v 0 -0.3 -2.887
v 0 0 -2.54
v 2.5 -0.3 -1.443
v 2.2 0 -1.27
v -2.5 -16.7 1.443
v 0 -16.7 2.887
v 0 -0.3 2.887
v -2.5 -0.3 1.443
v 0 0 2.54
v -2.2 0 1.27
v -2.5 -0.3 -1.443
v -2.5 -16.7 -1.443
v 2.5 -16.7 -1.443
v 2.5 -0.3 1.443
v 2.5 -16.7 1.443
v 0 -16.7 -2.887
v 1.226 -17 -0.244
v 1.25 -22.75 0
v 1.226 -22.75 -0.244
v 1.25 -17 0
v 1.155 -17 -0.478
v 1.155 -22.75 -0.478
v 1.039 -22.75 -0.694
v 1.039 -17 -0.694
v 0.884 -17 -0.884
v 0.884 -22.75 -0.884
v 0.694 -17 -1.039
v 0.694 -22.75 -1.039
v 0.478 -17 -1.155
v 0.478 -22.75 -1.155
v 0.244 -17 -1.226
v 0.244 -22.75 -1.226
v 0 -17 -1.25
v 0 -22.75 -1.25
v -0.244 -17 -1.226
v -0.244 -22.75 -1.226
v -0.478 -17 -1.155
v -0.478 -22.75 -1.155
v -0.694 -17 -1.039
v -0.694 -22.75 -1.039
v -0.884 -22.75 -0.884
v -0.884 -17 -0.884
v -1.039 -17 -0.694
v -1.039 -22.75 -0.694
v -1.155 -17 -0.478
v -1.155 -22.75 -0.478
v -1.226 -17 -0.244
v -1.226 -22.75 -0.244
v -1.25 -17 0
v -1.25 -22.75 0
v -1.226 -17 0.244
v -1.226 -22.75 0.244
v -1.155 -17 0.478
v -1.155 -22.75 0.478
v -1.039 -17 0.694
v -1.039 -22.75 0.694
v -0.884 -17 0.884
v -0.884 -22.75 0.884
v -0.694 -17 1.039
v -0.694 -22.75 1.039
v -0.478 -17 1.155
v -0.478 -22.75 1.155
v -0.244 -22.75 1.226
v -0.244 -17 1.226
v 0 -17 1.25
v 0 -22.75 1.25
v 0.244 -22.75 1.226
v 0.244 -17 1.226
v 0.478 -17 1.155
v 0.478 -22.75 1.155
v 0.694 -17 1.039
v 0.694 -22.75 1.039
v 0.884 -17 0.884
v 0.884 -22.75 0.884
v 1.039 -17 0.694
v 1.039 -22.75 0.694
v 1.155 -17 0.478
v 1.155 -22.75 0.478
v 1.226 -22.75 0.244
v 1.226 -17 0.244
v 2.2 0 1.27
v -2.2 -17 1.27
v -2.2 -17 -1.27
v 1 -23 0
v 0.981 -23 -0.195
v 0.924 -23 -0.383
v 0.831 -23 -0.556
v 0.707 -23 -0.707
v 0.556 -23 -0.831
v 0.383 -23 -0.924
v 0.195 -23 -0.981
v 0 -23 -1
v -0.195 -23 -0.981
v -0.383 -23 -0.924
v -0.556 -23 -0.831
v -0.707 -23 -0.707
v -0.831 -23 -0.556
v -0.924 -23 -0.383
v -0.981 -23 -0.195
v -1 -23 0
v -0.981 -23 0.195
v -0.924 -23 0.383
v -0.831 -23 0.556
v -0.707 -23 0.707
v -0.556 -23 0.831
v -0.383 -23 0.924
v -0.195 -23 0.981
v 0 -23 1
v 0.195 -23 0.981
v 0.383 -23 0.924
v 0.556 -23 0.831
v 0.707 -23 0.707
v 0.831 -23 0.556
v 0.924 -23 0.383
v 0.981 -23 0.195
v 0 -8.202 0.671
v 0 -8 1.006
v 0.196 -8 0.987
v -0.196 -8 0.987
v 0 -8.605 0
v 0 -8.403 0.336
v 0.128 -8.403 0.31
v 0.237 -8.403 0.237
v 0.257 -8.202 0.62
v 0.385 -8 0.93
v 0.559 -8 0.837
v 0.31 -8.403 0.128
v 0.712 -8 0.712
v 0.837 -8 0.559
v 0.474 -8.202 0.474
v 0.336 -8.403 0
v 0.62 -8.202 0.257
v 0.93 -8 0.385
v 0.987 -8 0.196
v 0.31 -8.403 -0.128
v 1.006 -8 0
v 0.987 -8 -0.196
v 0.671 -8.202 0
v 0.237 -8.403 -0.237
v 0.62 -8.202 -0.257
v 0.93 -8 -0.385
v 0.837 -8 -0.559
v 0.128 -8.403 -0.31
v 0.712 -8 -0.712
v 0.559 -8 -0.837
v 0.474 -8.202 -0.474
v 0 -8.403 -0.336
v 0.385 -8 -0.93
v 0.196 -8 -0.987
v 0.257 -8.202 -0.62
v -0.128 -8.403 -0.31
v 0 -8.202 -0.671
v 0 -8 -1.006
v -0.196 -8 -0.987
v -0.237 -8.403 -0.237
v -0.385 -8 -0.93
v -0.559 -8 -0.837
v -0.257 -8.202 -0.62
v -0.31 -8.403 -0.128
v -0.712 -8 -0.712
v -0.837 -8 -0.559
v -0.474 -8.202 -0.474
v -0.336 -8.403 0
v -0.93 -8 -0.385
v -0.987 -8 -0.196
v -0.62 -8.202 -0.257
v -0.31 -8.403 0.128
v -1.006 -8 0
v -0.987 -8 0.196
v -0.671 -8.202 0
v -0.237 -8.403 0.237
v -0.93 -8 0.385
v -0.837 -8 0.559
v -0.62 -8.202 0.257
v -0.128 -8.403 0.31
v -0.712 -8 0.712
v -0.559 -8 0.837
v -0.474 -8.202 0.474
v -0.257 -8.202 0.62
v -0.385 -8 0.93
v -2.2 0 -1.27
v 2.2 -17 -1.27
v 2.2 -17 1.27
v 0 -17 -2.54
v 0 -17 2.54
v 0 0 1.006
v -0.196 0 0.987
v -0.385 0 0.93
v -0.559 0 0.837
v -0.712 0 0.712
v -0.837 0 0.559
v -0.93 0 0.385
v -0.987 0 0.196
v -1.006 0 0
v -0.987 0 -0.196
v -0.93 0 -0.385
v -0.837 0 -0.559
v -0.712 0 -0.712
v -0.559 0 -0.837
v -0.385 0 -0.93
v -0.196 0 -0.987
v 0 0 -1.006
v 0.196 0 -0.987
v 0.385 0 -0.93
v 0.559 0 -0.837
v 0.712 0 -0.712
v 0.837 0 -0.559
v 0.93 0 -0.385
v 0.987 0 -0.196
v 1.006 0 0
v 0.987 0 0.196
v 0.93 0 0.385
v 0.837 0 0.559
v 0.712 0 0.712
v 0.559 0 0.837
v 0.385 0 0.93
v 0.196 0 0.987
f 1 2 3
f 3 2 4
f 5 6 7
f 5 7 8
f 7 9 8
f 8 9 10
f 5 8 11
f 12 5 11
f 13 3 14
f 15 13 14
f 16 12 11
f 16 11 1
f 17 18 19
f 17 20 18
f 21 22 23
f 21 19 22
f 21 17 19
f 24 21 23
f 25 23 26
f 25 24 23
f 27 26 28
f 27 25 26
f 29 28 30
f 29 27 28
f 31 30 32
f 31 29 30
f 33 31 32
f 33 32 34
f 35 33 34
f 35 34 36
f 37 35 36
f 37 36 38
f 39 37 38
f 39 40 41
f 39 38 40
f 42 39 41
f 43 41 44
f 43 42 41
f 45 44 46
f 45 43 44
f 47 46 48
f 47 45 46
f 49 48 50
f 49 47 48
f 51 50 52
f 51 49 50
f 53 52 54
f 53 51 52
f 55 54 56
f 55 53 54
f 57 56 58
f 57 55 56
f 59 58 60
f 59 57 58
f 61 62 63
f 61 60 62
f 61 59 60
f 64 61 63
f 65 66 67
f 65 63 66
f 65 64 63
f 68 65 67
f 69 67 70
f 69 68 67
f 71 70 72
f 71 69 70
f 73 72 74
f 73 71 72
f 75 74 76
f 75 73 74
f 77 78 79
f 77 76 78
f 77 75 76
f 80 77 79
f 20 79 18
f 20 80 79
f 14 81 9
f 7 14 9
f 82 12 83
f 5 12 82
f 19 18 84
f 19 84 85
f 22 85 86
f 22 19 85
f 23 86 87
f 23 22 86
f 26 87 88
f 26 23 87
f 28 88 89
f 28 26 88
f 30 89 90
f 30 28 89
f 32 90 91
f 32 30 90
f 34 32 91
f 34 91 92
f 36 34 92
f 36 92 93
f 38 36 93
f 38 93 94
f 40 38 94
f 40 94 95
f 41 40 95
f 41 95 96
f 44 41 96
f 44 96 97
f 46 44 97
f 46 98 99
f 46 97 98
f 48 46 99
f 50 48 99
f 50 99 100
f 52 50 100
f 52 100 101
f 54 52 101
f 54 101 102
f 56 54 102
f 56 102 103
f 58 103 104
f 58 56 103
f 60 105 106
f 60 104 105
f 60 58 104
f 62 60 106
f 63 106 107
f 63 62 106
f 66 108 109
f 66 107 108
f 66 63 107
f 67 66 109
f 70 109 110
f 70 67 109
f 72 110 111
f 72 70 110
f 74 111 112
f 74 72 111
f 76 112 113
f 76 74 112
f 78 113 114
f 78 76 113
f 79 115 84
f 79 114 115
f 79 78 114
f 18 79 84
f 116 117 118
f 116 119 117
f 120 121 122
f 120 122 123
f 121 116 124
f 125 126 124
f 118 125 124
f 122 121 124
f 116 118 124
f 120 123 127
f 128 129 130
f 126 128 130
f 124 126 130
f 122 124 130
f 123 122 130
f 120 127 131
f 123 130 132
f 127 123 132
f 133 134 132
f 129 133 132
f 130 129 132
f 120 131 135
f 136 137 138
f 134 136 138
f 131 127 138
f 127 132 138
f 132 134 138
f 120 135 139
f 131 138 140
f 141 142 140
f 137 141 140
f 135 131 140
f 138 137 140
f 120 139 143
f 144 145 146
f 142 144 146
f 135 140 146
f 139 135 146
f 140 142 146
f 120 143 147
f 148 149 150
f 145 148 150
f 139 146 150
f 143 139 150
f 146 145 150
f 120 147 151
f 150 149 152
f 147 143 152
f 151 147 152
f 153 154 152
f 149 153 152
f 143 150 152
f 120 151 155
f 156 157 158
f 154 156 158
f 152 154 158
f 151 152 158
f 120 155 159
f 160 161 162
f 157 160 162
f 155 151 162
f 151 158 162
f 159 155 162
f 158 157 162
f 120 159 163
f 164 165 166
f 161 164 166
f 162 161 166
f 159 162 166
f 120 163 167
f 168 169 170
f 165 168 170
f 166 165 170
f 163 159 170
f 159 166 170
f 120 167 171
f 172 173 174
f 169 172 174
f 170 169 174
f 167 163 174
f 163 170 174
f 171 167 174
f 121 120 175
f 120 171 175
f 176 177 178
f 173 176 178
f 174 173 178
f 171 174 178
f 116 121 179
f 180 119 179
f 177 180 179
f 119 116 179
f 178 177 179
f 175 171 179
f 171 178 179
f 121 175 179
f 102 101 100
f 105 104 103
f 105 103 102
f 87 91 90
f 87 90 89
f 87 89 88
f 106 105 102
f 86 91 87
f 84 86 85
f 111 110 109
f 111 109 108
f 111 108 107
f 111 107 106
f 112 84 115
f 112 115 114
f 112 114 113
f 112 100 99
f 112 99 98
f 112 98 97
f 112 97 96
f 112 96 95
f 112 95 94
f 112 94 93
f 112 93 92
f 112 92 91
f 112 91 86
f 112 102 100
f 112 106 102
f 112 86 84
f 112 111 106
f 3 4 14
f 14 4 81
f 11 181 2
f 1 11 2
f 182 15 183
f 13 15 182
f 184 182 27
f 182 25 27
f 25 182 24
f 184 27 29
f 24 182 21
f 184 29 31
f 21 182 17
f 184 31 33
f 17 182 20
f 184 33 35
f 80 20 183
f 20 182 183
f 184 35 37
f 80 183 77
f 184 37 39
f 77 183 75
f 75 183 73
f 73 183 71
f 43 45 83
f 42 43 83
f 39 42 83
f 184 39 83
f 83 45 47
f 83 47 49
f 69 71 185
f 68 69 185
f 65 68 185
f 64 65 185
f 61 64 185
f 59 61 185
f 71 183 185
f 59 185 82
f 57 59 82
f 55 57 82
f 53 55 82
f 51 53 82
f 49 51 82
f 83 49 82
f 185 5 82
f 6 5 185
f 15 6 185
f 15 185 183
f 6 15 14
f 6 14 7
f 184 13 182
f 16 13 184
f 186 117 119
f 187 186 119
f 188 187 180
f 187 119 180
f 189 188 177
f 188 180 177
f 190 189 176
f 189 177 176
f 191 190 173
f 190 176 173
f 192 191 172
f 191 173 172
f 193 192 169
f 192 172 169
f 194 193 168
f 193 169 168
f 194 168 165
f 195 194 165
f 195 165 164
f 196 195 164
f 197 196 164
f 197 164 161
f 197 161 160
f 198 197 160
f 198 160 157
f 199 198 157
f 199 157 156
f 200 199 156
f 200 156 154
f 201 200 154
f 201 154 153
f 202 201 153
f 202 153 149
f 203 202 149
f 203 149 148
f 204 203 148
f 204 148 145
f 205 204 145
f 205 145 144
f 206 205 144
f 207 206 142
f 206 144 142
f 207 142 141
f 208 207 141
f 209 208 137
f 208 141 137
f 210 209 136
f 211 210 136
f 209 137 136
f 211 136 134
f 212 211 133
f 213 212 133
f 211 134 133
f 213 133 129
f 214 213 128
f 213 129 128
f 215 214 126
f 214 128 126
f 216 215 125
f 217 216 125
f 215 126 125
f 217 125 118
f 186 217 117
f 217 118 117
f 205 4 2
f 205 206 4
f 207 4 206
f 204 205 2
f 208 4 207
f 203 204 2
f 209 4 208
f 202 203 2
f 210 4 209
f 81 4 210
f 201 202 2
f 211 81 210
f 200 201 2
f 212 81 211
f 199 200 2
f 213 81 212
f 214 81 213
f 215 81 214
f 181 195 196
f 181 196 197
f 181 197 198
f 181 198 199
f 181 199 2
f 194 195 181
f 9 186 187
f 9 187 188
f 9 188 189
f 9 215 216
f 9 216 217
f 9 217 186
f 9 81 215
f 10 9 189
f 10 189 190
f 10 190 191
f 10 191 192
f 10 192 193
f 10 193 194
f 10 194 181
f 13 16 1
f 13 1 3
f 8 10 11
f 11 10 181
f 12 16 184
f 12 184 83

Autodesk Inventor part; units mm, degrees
ref_plane "YZ Plane" through (0, 0, 0) normal (1, 0, 0) x (0, 1, 0)
ref_plane "XZ Plane" through (0, 0, 0) normal (0, 1, 0) x (-1, 0, 0)
ref_plane "XY Plane" through (0, 0, 0) normal (0, 0, 1) x (1, 0, 0)
sketch "Skizze1" plane through (0, 0, 0) normal (0, 1, 0) x (-1, 0, 0)
  line L0 (2.5, -1.4434) -> (0, -2.8868)
  line L1 (0, -2.8868) -> (-2.5, -1.4434)
  line L2 (-2.5, -1.4434) -> (-2.5, 1.4434)
  line L3 (-2.5, 1.4434) -> (0, 2.8868)
  line L4 (0, 2.8868) -> (2.5, 1.4434)
  line L5 (2.5, 1.4434) -> (2.5, -1.4434)
  point P0 (0, 0)
  point P1 (0, 0)
  point P2 (0, 0)
  dimension "d0" = 5
extrude "Extrusion1" add sketch "Skizze1" against normal blind 17
hole "Bohrung1" at (0, 0, 0) direction (0, -1, 0) diameter 2.013 depth 8 tip angle 118 thread size "M2.5x0.45" class "6H" standard "ISO Metric profile"
sketch "Skizze2" plane through (0, -17, 0) normal (0, -1, 0) x (1, 0, 0)
  circle A0 centre (0, 0) radius 1.0065 projected
  circle A1 centre (0, 0) radius 1.25
  dimension "d10" = 2.5
extrude "Extrusion2" add sketch "Skizze2" along normal blind 6 contours A0 | A1
thread "Gewinde1" size "M2.5x0.45" class "6g" standard "ISO Metric profile" full length
chamfer "Fasen1" distance 0.25 angle 45 1 edges at (-1.25, -23, 0)
chamfer "Fasen2" distance 0.3 angle 45 12 edges at (2.5, 0, 0) (1.25, 0, 2.1651) (-1.25, 0, 2.1651) (-2.5, 0, 0) (-1.25, 0, -2.1651) (1.25, 0, -2.1651) (2.5, -17, 0) (1.25, -17, 2.1651) (-1.25, -17, 2.1651) (-2.5, -17, 0) (-1.25, -17, -2.1651) (1.25, -17, -2.1651)
properties part number "Abstandsbolzen 17mm"
